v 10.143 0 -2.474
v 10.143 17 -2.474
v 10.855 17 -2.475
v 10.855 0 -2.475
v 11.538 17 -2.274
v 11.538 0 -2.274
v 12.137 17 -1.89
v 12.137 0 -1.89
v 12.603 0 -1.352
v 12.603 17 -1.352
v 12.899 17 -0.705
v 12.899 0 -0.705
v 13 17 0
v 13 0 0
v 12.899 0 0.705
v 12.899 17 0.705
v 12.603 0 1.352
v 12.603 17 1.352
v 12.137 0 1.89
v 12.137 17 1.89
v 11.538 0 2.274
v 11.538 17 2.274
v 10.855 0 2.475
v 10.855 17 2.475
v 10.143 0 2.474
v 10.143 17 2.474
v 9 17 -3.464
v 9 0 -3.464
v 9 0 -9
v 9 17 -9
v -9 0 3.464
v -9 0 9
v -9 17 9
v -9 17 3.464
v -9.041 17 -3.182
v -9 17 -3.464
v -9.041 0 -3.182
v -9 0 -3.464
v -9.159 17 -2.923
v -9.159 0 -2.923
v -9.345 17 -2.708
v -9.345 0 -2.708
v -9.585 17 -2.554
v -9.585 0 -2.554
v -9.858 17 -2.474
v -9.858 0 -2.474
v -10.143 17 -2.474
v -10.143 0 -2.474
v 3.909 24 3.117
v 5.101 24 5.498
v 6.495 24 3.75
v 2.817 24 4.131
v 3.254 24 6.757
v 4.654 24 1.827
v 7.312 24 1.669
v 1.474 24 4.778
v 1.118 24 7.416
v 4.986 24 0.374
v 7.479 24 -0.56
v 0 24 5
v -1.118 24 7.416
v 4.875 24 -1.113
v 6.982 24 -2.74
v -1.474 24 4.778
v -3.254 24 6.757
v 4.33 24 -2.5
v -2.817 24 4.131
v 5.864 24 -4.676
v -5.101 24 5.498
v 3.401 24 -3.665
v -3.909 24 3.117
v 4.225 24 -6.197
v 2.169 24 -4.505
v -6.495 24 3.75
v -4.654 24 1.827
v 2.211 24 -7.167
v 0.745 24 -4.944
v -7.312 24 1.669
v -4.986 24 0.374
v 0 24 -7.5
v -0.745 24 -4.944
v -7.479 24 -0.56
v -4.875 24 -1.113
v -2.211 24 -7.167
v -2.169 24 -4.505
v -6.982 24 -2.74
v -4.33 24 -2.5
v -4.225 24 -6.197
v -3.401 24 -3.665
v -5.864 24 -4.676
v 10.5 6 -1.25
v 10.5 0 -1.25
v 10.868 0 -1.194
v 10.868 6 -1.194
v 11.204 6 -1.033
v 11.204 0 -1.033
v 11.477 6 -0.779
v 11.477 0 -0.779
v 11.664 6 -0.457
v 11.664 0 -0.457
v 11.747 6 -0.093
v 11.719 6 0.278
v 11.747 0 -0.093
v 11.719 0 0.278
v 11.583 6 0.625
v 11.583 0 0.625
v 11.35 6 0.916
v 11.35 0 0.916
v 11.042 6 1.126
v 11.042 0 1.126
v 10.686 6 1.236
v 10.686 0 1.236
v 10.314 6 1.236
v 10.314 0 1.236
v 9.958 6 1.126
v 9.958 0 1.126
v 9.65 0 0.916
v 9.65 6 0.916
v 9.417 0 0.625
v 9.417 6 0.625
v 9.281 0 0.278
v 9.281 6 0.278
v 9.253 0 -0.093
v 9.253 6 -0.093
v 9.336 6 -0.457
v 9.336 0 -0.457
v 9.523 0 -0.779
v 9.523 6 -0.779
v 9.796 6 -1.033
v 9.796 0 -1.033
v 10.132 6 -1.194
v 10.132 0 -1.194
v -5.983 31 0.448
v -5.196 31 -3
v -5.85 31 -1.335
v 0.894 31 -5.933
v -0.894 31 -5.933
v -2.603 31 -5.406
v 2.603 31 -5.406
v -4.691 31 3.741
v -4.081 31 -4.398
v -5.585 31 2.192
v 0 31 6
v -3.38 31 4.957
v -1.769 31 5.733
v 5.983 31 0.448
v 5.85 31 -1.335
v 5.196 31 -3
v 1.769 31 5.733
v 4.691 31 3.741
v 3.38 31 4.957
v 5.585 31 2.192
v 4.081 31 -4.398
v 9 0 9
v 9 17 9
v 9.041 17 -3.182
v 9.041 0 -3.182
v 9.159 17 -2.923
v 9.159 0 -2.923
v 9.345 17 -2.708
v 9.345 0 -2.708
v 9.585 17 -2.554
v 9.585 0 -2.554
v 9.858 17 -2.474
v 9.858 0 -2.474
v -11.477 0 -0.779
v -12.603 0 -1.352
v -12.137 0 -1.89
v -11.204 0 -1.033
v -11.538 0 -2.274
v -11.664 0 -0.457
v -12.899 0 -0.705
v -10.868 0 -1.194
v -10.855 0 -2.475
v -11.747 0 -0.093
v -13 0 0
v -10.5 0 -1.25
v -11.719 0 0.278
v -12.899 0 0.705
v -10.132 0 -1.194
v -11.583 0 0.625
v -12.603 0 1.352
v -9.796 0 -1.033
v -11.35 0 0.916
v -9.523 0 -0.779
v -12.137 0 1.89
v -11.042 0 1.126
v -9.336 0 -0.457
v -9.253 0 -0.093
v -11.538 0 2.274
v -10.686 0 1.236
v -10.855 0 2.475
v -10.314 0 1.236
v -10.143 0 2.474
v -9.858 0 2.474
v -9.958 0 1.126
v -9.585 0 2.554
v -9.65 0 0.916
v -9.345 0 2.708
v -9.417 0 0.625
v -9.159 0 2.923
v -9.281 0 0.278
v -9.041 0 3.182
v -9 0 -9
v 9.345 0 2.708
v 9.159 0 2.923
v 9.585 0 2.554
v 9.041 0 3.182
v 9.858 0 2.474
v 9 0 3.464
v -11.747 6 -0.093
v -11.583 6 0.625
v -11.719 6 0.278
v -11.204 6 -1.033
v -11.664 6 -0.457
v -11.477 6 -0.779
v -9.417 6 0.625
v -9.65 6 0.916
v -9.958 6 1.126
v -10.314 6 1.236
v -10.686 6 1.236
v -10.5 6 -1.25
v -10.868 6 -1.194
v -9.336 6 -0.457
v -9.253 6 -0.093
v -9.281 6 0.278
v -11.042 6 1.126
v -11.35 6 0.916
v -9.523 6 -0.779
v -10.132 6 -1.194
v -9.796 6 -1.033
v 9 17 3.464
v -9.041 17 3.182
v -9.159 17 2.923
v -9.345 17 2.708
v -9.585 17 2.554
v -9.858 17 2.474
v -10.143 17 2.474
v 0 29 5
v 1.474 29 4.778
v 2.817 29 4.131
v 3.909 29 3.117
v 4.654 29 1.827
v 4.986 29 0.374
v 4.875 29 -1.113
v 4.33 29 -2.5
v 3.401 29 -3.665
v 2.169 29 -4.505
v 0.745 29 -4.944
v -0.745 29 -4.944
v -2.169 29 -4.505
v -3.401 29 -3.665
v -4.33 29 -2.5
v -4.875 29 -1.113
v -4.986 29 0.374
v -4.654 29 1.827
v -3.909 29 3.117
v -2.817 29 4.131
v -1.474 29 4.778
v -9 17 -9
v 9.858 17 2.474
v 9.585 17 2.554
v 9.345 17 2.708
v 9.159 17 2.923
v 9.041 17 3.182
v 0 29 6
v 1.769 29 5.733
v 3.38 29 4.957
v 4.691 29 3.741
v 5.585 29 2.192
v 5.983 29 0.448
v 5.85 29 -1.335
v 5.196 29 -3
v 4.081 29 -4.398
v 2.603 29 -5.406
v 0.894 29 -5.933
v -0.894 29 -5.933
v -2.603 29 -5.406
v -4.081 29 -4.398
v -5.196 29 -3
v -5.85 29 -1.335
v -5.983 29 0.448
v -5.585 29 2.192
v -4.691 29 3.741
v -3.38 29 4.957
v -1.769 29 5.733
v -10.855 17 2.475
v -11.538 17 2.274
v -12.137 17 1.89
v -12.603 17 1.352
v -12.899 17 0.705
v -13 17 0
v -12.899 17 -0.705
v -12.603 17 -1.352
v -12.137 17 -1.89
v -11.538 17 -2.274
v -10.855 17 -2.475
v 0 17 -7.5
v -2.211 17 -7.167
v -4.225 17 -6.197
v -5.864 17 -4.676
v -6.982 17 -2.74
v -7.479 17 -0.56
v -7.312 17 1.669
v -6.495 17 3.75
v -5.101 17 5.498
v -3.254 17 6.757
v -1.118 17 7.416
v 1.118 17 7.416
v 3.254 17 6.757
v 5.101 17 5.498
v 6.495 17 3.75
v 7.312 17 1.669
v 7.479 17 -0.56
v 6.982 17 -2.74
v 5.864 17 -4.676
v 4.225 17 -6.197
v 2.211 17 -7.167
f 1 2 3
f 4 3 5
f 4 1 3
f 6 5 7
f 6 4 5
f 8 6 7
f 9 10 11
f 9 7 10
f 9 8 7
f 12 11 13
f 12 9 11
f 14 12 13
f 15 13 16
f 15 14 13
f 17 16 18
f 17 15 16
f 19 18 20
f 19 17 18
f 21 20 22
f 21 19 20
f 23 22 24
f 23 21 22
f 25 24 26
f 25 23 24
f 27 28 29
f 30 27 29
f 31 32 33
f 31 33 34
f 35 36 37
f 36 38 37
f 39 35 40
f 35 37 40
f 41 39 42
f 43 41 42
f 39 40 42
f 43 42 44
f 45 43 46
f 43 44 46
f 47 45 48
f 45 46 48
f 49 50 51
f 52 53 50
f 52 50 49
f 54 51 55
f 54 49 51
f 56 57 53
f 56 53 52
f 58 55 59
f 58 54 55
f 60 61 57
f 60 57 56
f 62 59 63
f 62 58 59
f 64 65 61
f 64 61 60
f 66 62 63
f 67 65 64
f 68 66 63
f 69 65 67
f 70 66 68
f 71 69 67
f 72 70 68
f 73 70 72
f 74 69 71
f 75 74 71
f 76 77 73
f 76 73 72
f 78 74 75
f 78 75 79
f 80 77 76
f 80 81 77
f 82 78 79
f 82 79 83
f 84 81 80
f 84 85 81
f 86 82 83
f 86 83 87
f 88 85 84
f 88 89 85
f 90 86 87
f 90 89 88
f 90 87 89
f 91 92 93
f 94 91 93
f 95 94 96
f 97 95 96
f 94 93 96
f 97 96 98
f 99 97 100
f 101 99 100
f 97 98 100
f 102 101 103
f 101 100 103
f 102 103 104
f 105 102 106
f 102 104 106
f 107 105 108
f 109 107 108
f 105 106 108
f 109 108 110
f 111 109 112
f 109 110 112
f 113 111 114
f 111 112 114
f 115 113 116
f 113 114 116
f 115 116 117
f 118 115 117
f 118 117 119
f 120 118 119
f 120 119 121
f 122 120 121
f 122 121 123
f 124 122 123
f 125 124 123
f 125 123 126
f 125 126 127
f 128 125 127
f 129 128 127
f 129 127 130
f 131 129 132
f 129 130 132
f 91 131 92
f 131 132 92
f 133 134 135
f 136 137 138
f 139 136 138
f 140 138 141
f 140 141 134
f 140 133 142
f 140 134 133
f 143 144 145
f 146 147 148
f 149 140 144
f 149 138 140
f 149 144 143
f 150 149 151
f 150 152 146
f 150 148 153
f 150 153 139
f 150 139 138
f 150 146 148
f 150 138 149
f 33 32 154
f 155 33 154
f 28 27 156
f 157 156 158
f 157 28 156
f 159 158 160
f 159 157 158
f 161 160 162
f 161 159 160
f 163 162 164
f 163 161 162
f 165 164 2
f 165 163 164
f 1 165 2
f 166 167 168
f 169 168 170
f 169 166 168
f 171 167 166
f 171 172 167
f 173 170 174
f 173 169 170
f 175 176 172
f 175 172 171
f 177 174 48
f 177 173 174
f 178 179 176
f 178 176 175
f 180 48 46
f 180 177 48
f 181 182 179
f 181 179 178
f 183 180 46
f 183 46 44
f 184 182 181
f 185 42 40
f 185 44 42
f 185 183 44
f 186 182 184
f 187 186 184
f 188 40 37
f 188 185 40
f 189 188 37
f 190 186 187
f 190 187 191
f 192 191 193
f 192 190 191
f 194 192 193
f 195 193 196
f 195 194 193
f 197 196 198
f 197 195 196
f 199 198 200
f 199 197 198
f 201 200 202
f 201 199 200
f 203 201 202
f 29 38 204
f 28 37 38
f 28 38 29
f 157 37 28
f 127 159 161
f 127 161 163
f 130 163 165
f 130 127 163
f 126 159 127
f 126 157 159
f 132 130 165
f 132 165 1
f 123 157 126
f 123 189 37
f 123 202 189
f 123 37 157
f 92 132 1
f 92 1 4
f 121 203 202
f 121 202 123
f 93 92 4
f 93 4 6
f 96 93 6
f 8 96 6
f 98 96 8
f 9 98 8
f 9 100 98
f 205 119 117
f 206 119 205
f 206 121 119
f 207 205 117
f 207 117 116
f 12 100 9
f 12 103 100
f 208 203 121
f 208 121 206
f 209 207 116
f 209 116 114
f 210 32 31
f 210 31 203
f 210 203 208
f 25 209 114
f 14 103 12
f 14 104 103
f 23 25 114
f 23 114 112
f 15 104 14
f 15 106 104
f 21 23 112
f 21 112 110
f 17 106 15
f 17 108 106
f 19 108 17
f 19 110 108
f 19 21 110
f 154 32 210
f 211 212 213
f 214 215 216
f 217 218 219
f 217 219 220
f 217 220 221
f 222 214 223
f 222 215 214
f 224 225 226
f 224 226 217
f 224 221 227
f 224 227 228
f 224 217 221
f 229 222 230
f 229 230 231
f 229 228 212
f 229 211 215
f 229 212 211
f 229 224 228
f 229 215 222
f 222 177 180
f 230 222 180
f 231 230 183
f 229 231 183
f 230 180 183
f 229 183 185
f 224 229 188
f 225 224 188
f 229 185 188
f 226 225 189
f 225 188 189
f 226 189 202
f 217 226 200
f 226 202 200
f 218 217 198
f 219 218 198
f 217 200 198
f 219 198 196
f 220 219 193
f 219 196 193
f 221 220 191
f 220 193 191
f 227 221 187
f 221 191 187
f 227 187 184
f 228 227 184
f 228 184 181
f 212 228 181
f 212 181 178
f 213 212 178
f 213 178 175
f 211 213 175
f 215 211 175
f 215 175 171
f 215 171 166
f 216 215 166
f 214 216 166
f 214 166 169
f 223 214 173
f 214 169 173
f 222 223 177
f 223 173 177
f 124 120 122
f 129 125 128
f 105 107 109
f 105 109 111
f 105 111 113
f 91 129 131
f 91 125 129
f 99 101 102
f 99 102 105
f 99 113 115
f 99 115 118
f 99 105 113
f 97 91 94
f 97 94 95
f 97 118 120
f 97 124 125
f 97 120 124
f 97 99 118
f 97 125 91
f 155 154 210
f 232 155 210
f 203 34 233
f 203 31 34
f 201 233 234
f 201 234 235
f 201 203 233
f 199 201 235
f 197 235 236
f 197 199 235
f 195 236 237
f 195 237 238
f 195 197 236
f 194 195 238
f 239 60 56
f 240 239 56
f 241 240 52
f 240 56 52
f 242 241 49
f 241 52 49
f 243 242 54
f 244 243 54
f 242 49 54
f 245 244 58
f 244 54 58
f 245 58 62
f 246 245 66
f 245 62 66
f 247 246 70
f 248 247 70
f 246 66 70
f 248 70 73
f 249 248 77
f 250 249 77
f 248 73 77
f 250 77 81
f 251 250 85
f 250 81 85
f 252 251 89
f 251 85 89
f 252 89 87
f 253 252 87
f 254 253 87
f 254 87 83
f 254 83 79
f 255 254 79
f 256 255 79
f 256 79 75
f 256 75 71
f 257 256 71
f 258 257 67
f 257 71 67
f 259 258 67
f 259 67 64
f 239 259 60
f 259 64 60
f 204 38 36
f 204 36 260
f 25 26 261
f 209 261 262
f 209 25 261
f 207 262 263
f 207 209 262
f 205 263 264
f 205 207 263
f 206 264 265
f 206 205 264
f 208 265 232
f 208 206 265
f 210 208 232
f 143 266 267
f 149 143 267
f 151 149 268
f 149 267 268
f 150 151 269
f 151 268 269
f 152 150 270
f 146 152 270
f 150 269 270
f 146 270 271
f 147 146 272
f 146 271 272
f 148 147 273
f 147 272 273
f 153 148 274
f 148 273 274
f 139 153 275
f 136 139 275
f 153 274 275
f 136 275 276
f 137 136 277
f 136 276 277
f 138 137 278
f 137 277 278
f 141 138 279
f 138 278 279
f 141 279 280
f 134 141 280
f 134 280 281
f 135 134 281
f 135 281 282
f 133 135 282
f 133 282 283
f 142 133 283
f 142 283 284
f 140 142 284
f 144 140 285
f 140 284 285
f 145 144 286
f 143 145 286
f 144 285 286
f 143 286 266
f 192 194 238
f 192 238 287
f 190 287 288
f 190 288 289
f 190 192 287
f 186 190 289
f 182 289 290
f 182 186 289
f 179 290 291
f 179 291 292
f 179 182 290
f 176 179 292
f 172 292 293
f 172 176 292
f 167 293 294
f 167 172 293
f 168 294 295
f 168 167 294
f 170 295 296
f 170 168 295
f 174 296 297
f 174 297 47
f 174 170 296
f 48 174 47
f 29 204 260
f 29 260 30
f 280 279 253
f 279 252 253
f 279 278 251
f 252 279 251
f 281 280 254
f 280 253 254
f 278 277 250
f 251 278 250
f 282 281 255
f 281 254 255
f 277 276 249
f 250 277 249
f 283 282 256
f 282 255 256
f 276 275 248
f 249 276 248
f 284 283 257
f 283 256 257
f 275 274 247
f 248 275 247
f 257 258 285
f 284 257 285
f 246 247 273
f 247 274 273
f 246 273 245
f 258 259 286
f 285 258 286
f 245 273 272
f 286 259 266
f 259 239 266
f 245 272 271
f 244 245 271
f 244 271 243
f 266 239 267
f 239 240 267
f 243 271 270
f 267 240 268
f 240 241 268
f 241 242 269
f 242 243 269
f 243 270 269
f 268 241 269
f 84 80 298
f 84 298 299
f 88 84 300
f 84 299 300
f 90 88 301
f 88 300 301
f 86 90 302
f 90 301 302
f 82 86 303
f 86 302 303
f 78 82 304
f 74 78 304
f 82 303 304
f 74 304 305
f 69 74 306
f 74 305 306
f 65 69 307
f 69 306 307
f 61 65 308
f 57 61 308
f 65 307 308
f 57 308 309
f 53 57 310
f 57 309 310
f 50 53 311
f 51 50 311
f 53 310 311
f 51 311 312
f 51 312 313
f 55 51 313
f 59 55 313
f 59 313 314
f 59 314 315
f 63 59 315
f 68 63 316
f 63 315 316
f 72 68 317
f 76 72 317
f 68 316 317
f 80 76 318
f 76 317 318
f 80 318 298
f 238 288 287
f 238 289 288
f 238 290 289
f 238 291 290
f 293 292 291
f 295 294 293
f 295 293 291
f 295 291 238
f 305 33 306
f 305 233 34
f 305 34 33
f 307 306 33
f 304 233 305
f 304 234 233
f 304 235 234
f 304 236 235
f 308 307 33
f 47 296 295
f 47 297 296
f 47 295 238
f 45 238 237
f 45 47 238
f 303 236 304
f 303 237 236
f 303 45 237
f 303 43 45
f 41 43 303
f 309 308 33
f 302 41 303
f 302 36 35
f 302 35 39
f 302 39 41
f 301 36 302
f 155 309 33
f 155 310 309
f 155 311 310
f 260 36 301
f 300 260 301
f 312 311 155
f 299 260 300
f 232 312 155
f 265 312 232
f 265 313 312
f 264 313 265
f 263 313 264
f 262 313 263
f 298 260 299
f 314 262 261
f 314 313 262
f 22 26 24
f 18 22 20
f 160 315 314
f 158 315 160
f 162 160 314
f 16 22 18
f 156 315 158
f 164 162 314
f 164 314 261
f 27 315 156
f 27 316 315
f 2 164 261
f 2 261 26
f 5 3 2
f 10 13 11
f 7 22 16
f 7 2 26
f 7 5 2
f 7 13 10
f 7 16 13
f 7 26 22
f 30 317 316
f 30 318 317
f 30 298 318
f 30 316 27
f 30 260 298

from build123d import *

# Parameters (mm, degrees)
SKETCH1_W           = 18
SKETCH1_H           = 18
BOSS_EXTRUDE1_DEPTH = 17
SKETCH2_R           = 7.5
BOSS_EXTRUDE2_DEPTH = 7
SKETCH3_R           = 5
BOSS_EXTRUDE3_DEPTH = 5
SKETCH4_R           = 6
BOSS_EXTRUDE4_DEPTH = 2
SKETCH5_R           = 2.5
BOSS_EXTRUDE5_DEPTH = 17
FILLET1_R           = 1
SKETCH6_R           = 1.25
CUT_EXTRUDE1_DEPTH  = 6


with BuildPart() as part:
    # Sketch1 → Boss-Extrude1 (new body)
    with BuildSketch(Plane(origin=(0, 0, 0), x_dir=(1, 0, 0), z_dir=(0, 1, 0))):
        Rectangle(SKETCH1_W, SKETCH1_H)
    extrude(amount=BOSS_EXTRUDE1_DEPTH)

    # Sketch2 → Boss-Extrude2 (add)
    with BuildSketch(Plane(origin=(0, 17, 0), x_dir=(1, 0, 0), z_dir=(0, 1, 0))):
        with Locations(Location((0, 0, 0), (0, 0, 90))):
            Circle(SKETCH2_R)
    extrude(amount=BOSS_EXTRUDE2_DEPTH)

    # Sketch3 → Boss-Extrude3 (add)
    with BuildSketch(Plane(origin=(0, 24, 0), x_dir=(1, 0, 0), z_dir=(0, 1, 0))):
        with Locations(Location((0, 0, 0), (0, 0, 270))):
            Circle(SKETCH3_R)
    extrude(amount=BOSS_EXTRUDE3_DEPTH)

    # Sketch4 → Boss-Extrude4 (add)
    with BuildSketch(Plane(origin=(0, 29, 0), x_dir=(1, 0, 0), z_dir=(0, 1, 0))):
        with Locations(Location((0, 0, 0), (0, 0, 270))):
            Circle(SKETCH4_R)
    extrude(amount=BOSS_EXTRUDE4_DEPTH)

    # Sketch5 → Boss-Extrude5 (add)
    with BuildSketch(Plane.XZ):
        with Locations((-10.5, 0)):
            Circle(SKETCH5_R)
        with Locations((10.5, 0)):
            Circle(SKETCH5_R)
    extrude(amount=-BOSS_EXTRUDE5_DEPTH)

    # Fillet1
    fillet1_edges = [part.edges().sort_by_distance(p)[0] for p in [
        (-9, 8.5, 2),
        (-9, 8.5, -2),
        (9, 8.5, -2),
        (9, 8.5, 2),
    ]]
    fillet(fillet1_edges, radius=FILLET1_R)

    # Sketch6 → Cut-Extrude1 (cut)
    with BuildSketch(Plane.XZ):
        with Locations(Location((-10.5, 0, 0), (0, 0, 270))):
            Circle(SKETCH6_R)
        with Locations(Location((10.5, 0, 0), (0, 0, 270))):
            Circle(SKETCH6_R)
    extrude(amount=-CUT_EXTRUDE1_DEPTH, mode=Mode.SUBTRACT)


solid = part.part
